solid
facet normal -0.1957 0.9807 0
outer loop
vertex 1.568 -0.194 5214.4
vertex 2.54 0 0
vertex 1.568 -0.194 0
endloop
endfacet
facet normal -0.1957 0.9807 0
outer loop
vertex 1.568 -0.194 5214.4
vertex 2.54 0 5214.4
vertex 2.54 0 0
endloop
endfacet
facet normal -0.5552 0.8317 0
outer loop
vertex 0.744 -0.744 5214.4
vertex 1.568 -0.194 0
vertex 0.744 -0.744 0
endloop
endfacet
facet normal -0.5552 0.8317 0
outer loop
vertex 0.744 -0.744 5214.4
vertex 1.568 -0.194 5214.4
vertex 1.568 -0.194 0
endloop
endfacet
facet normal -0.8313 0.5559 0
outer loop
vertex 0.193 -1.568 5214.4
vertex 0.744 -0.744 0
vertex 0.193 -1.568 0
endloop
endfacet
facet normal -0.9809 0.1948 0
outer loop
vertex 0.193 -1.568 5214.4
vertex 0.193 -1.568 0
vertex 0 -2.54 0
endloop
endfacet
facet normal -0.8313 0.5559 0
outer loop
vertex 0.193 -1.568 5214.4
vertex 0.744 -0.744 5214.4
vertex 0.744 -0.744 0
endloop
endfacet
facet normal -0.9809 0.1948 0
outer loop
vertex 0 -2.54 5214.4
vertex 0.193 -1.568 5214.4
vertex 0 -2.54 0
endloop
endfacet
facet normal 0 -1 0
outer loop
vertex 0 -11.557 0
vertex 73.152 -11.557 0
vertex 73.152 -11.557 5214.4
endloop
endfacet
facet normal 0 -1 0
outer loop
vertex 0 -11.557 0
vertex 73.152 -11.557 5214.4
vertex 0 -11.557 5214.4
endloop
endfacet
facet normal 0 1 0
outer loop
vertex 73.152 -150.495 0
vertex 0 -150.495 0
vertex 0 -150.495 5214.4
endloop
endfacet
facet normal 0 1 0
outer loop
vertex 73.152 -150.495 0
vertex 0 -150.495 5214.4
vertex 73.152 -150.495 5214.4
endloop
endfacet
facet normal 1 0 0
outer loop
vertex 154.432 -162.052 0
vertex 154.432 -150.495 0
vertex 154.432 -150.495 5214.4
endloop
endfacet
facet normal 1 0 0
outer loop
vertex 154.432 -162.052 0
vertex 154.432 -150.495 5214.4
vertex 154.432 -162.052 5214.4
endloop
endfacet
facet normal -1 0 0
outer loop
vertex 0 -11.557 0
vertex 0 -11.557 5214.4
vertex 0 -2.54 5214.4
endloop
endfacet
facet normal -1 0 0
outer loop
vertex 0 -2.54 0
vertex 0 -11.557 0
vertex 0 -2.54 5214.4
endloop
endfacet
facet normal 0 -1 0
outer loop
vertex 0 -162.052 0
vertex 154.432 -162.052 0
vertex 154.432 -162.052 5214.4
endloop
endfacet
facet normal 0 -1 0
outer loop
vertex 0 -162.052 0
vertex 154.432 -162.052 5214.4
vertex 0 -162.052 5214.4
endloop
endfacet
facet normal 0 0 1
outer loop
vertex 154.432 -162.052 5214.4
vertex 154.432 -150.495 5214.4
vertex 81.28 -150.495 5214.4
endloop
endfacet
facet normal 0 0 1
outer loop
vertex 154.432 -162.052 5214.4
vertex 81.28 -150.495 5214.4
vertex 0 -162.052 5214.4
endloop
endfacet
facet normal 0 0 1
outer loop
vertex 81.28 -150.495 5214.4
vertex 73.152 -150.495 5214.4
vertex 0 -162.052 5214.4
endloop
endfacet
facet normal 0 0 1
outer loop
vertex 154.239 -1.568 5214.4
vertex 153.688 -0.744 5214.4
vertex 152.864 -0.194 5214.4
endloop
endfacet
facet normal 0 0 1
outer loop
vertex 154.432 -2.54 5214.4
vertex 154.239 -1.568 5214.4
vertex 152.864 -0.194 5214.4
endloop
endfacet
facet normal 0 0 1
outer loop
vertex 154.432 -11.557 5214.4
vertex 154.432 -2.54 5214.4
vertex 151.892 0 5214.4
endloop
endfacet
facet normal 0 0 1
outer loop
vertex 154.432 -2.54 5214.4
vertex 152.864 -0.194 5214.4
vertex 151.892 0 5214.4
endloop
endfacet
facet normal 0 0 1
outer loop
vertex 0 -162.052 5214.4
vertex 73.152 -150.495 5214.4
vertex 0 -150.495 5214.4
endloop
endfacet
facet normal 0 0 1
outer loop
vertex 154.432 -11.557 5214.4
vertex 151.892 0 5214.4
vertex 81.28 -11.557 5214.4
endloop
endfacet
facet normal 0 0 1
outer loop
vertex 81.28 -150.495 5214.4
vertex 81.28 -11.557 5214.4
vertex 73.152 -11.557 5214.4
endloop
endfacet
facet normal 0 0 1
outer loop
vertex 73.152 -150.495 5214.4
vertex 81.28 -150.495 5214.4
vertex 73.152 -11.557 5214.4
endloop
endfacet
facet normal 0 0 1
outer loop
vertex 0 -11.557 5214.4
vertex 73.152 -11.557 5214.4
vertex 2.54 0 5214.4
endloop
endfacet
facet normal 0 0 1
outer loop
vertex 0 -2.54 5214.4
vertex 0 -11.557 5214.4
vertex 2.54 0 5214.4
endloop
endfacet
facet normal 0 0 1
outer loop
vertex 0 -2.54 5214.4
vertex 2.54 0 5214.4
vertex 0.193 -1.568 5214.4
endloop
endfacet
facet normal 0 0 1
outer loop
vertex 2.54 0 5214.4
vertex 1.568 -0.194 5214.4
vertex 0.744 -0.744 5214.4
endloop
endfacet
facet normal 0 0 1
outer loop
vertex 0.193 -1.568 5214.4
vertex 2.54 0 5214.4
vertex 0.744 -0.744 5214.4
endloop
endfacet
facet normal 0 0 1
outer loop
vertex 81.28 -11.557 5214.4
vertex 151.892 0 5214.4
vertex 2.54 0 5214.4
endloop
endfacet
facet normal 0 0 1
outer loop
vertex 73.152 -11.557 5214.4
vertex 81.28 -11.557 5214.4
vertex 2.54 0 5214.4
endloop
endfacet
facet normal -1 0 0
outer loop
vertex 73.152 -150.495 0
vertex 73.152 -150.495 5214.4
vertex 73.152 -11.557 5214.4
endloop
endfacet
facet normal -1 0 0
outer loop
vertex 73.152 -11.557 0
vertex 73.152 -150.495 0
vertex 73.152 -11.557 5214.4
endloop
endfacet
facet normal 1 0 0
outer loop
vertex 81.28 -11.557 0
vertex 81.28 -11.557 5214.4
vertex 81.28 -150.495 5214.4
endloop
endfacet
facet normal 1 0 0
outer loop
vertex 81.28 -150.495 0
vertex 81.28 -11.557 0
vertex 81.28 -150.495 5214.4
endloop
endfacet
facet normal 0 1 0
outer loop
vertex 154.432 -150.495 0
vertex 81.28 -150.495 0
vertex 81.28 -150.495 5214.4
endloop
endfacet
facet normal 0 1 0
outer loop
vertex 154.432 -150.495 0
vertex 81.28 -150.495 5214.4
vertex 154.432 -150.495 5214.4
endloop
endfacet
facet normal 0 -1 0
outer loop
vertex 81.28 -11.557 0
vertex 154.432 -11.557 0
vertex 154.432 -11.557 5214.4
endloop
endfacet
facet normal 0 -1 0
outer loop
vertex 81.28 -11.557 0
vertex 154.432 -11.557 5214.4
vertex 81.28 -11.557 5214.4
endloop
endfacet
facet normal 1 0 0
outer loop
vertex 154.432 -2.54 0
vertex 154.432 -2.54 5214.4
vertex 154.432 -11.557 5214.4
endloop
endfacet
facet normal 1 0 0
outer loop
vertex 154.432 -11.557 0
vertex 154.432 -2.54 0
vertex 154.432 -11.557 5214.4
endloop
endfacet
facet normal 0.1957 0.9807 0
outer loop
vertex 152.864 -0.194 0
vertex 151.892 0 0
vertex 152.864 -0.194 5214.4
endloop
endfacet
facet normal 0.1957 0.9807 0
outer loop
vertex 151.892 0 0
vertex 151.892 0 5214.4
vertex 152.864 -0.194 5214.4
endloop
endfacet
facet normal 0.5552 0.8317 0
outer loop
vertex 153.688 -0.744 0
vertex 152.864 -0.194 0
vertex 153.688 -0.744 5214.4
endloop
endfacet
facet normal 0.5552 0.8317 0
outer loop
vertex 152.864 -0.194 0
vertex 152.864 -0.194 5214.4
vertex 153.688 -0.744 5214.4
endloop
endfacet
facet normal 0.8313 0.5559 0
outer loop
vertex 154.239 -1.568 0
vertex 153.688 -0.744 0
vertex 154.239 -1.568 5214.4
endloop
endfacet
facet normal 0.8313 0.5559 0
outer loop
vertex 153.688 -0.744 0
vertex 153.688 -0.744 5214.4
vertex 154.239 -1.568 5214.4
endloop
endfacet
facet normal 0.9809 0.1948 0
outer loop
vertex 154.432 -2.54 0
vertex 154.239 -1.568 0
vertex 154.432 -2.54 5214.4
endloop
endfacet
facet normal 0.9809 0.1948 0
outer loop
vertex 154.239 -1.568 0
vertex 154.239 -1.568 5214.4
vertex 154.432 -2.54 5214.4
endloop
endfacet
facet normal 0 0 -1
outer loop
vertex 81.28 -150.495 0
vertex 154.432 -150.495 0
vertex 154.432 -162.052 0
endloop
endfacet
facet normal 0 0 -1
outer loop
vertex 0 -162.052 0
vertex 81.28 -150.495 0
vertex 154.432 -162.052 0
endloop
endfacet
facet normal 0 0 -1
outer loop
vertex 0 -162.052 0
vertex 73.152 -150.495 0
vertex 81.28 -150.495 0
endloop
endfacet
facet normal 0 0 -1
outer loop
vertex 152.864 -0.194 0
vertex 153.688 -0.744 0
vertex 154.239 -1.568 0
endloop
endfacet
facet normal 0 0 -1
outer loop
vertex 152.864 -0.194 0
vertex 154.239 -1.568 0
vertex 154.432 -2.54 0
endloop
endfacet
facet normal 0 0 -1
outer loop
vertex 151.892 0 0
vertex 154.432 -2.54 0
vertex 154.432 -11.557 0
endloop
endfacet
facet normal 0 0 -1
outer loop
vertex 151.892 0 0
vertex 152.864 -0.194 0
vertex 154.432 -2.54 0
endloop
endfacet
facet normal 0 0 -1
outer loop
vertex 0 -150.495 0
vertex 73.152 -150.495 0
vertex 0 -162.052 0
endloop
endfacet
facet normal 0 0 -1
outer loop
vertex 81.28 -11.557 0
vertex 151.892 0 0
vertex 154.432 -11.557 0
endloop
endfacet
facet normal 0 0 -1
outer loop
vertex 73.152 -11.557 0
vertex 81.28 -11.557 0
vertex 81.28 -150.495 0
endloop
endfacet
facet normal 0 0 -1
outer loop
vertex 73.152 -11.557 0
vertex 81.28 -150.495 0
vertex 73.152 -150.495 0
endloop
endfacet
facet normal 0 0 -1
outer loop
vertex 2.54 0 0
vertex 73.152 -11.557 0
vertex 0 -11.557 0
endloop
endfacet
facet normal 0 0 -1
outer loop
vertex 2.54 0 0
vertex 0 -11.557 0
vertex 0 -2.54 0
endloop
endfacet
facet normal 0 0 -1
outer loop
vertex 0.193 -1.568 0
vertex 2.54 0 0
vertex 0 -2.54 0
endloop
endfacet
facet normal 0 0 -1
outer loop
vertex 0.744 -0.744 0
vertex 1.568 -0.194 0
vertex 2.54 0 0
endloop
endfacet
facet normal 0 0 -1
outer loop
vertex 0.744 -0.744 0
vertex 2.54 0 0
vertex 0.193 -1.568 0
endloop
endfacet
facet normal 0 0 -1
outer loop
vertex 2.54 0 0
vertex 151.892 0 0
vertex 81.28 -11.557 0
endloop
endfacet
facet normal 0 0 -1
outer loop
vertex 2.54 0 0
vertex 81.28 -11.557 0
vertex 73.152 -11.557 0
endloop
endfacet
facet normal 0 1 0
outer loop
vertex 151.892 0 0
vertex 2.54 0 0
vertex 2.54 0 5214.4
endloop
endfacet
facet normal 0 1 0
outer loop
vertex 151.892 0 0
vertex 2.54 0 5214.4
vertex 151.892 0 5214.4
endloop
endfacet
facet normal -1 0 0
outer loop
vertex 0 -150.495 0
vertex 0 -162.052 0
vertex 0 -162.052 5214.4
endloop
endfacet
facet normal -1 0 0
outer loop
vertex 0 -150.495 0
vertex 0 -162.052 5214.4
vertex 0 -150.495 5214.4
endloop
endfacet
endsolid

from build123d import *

# Parameters (mm, degrees)
BOSS_EXTRUDE1_DEPTH = 5214.4
FILLET1_R           = 2.54


with BuildPart() as part:
    # Sketch1 → Boss-Extrude1 (new body)
    with BuildSketch(Plane.XY):
        Polygon((0, -0.000240533), (154.432, -0.000240533), (154.432, -11.557240533), (81.28, -11.557240533), (81.28, -150.495240533), (154.432, -150.495240533), (154.432, -162.052240533), (0, -162.052240533), (0, -150.495240533), (73.152, -150.495240533), (73.152, -11.557240533), (0, -11.557240533), align=None)
    extrude(amount=BOSS_EXTRUDE1_DEPTH)

    # Fillet1
    fillet1_edges = [part.edges().sort_by_distance(p)[0] for p in [
        (0, -0.000240533, 2607.2),
        (154.432, -0.000240533, 2607.2),
    ]]
    fillet(fillet1_edges, radius=FILLET1_R)


solid = part.part
